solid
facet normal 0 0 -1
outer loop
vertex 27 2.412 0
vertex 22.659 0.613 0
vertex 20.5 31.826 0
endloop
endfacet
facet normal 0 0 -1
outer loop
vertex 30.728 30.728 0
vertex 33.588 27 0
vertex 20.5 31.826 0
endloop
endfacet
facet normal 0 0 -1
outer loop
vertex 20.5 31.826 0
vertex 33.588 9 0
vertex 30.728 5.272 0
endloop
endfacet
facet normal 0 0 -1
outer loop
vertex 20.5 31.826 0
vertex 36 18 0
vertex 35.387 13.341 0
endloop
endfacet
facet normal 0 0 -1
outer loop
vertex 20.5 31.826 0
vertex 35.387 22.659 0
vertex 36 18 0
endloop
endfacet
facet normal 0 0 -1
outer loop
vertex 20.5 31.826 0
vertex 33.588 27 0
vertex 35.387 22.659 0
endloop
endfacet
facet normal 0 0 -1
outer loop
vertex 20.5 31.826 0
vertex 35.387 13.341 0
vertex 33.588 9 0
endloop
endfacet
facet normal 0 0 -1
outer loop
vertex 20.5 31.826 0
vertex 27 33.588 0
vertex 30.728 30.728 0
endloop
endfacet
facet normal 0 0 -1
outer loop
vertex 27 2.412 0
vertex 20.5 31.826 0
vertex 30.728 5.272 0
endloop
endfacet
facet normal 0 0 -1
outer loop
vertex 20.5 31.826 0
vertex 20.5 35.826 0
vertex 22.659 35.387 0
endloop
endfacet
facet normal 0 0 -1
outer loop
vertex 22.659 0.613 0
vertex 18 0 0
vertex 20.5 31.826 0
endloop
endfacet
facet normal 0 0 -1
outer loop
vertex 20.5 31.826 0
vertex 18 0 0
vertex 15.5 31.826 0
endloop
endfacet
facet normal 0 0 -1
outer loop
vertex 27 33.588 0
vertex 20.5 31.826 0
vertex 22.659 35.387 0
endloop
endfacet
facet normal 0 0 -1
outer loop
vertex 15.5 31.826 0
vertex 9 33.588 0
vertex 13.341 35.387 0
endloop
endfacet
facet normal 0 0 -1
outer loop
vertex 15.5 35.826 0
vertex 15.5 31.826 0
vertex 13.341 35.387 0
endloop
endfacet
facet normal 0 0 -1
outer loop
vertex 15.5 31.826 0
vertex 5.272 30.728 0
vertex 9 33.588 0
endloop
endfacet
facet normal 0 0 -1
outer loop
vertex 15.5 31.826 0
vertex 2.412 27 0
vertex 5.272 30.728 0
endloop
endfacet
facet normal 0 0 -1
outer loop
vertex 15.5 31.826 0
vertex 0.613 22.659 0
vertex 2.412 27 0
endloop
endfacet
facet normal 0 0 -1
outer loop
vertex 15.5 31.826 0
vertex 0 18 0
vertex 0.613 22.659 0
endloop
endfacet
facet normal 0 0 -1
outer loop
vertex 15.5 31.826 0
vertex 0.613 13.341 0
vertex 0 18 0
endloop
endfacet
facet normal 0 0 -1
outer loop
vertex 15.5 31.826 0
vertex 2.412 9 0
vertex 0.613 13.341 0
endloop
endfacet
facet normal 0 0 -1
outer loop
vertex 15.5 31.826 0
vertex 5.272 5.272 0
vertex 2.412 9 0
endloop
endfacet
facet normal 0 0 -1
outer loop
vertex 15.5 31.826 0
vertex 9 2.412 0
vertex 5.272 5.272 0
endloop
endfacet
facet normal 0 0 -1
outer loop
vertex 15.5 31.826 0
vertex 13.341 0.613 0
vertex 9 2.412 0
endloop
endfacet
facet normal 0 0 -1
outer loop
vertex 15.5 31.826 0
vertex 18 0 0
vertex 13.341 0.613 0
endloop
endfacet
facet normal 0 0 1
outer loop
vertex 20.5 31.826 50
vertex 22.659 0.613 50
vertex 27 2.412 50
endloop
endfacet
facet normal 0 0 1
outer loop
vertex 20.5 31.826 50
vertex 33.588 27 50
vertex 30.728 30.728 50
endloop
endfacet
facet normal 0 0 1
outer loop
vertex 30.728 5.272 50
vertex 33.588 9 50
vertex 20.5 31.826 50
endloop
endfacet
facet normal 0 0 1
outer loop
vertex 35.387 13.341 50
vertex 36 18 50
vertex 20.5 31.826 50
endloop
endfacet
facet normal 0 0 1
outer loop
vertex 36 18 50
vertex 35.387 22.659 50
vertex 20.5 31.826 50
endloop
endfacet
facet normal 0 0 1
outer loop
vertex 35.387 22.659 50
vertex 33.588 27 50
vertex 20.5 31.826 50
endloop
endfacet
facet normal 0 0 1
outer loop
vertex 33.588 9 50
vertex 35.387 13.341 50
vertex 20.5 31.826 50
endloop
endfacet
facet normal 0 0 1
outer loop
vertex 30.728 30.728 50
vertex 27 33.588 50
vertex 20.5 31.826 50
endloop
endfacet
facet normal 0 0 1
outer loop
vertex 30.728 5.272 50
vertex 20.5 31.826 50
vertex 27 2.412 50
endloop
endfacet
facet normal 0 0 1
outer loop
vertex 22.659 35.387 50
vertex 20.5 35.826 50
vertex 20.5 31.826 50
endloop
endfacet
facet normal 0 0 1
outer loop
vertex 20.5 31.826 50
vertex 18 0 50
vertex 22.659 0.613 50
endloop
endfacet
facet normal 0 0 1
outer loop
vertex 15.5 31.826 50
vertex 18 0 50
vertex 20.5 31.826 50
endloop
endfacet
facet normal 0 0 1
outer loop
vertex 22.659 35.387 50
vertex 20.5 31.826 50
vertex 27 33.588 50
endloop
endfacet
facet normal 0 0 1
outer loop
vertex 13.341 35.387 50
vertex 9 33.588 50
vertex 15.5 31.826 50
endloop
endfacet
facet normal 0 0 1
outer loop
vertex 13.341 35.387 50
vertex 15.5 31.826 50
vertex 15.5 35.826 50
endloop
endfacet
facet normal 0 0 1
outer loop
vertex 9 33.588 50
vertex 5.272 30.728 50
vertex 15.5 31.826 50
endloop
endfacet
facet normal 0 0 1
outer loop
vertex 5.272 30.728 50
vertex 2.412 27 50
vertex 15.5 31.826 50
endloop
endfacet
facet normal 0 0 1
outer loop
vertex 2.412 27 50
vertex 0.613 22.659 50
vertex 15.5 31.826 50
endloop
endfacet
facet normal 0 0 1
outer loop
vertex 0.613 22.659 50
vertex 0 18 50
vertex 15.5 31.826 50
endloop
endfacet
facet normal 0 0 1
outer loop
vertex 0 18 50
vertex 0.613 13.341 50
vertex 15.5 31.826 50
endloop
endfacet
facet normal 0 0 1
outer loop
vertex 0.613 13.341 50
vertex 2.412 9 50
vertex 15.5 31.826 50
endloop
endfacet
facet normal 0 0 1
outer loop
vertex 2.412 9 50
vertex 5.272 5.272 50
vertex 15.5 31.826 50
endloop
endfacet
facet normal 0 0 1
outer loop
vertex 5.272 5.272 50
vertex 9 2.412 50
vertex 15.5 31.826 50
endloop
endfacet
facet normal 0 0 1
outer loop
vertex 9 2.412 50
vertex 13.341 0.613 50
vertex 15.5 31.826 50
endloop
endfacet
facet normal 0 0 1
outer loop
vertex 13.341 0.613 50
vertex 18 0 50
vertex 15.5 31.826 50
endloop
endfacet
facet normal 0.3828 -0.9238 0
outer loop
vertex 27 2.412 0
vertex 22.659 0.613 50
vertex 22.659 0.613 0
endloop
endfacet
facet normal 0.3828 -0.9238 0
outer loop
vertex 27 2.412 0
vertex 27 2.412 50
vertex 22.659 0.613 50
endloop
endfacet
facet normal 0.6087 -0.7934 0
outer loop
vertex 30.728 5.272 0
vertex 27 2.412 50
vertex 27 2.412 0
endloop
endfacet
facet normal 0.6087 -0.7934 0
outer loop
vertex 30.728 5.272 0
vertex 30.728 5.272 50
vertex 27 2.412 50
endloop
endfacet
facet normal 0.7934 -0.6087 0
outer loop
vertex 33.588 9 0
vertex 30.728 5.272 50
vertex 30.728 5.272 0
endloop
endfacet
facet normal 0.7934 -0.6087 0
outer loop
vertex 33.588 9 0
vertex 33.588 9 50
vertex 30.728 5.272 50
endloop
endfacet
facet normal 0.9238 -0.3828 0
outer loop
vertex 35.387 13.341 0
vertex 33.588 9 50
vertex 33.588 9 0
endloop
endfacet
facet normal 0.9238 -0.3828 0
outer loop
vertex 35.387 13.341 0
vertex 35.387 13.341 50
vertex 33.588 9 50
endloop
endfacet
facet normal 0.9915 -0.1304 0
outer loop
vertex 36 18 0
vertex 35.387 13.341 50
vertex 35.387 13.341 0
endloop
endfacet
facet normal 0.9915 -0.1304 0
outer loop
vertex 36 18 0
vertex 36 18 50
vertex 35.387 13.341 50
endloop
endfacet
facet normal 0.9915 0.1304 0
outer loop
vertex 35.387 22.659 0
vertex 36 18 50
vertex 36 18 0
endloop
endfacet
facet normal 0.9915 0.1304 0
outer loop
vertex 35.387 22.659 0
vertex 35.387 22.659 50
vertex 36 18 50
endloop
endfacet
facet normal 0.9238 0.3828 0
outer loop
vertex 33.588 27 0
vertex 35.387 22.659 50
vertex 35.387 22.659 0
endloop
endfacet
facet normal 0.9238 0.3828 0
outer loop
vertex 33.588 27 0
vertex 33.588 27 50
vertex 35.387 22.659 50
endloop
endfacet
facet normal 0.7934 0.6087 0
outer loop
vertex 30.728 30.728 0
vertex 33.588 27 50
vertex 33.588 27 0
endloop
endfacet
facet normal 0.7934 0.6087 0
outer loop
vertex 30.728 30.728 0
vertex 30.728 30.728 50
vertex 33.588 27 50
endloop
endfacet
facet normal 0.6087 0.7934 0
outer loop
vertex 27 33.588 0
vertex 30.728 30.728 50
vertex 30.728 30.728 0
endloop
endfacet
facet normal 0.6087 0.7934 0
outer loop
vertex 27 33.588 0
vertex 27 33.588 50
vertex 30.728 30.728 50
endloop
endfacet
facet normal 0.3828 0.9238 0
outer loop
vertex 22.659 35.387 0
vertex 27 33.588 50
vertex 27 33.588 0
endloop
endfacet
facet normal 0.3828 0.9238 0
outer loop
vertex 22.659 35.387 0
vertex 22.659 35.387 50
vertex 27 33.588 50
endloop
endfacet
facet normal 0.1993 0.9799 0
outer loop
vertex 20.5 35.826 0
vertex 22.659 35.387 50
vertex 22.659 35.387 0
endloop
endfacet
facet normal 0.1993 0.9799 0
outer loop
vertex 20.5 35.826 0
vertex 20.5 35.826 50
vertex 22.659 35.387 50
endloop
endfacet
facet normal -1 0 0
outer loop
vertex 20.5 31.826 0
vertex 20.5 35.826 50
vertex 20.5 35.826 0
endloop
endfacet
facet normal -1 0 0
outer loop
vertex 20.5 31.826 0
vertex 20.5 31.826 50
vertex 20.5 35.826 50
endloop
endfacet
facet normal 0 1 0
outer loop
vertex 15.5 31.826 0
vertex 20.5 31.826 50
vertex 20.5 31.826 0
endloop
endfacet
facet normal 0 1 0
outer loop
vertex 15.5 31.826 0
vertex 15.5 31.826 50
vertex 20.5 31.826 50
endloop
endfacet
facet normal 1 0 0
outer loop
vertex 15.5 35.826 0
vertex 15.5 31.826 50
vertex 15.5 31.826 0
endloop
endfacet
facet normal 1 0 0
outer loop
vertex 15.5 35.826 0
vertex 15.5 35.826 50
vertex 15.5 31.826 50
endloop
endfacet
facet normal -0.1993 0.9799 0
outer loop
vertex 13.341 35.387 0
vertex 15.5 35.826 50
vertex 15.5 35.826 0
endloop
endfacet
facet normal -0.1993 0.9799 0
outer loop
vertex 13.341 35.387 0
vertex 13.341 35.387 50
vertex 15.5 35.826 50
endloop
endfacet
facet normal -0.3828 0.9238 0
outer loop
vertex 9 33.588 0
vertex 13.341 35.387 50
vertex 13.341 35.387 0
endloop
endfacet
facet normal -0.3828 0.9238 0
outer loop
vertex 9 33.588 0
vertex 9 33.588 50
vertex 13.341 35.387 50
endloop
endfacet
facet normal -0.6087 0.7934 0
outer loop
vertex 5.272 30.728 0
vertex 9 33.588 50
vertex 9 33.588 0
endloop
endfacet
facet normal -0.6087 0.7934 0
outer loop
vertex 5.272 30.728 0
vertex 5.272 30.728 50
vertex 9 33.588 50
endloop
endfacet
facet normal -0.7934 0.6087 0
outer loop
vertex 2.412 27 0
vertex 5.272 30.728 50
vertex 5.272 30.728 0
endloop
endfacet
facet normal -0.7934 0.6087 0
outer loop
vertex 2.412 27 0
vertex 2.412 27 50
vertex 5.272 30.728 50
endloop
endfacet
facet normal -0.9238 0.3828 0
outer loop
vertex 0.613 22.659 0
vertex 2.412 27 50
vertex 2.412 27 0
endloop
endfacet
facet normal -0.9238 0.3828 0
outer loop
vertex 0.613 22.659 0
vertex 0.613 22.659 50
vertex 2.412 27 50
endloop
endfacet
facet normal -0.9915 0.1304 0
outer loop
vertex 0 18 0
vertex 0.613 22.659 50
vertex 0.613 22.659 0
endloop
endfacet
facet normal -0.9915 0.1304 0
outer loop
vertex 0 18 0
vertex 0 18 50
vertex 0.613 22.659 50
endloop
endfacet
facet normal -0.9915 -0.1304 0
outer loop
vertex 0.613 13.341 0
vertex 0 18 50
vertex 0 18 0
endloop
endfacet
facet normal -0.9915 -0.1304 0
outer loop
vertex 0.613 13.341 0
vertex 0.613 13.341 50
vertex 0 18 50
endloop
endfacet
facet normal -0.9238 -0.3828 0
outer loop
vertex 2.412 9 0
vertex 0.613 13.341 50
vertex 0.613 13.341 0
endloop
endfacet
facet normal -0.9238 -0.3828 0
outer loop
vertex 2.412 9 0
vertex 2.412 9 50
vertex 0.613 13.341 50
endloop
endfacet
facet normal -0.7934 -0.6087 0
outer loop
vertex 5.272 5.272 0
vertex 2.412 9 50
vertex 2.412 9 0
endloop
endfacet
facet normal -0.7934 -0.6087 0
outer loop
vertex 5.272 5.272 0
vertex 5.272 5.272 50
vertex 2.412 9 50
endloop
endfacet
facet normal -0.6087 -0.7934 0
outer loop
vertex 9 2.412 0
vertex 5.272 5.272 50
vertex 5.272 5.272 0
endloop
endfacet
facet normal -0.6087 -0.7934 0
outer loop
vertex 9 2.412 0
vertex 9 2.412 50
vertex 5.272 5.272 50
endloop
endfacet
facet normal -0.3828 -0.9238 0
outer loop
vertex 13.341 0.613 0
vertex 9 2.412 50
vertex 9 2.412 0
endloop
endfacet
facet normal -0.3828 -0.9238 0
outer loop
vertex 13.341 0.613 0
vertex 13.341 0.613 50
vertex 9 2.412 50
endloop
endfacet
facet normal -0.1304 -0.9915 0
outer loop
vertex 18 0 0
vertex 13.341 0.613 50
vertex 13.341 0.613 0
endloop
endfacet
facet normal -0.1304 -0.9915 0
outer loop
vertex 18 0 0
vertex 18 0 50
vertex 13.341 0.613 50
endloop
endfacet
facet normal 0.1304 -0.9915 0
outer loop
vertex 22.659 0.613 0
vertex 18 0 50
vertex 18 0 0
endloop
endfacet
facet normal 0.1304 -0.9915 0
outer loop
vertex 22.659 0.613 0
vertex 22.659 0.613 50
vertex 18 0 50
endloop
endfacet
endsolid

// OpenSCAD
$fn = 32;

// ----------------------------------------------------------------------
// Keyway shaft: d36 shaft, key 5 x 4 mm
// ----------------------------------------------------------------------

// --- parameters (mm) ---
shaft_r = 18;             // shaft radius
key_w = 5;                // keyway width
key_d = 4;                // keyway depth below the surface line
plate_t = 50;             // shaft length, Z (extrusion height)
fit_tol = 0.02;           // declared fit tolerance (prompt contract)
free_tol = 0.2;           // declared free tolerance (prompt contract)

shaft_d = 2 * shaft_r;  // shaft diameter
circle_step = 15;  // polygon sampling step, degrees

profile = [[13.341, 35.387], [9, 33.588], [5.272, 30.728], [2.412, 27], [0.613, 22.659], [0, 18], [0.613, 13.341], [2.412, 9], [5.272, 5.272], [9, 2.412], [13.341, 0.613], [18, 0], [22.659, 0.613], [27, 2.412], [30.728, 5.272], [33.588, 9], [35.387, 13.341], [36, 18], [35.387, 22.659], [33.588, 27], [30.728, 30.728], [27, 33.588], [22.659, 35.387], [20.5, 35.826], [20.5, 31.826], [15.5, 31.826], [15.5, 35.826]];  // primary outline, 27 points, counter clockwise

// --- the one profile operation ---
linear_extrude(height = plate_t) polygon(points = profile);
